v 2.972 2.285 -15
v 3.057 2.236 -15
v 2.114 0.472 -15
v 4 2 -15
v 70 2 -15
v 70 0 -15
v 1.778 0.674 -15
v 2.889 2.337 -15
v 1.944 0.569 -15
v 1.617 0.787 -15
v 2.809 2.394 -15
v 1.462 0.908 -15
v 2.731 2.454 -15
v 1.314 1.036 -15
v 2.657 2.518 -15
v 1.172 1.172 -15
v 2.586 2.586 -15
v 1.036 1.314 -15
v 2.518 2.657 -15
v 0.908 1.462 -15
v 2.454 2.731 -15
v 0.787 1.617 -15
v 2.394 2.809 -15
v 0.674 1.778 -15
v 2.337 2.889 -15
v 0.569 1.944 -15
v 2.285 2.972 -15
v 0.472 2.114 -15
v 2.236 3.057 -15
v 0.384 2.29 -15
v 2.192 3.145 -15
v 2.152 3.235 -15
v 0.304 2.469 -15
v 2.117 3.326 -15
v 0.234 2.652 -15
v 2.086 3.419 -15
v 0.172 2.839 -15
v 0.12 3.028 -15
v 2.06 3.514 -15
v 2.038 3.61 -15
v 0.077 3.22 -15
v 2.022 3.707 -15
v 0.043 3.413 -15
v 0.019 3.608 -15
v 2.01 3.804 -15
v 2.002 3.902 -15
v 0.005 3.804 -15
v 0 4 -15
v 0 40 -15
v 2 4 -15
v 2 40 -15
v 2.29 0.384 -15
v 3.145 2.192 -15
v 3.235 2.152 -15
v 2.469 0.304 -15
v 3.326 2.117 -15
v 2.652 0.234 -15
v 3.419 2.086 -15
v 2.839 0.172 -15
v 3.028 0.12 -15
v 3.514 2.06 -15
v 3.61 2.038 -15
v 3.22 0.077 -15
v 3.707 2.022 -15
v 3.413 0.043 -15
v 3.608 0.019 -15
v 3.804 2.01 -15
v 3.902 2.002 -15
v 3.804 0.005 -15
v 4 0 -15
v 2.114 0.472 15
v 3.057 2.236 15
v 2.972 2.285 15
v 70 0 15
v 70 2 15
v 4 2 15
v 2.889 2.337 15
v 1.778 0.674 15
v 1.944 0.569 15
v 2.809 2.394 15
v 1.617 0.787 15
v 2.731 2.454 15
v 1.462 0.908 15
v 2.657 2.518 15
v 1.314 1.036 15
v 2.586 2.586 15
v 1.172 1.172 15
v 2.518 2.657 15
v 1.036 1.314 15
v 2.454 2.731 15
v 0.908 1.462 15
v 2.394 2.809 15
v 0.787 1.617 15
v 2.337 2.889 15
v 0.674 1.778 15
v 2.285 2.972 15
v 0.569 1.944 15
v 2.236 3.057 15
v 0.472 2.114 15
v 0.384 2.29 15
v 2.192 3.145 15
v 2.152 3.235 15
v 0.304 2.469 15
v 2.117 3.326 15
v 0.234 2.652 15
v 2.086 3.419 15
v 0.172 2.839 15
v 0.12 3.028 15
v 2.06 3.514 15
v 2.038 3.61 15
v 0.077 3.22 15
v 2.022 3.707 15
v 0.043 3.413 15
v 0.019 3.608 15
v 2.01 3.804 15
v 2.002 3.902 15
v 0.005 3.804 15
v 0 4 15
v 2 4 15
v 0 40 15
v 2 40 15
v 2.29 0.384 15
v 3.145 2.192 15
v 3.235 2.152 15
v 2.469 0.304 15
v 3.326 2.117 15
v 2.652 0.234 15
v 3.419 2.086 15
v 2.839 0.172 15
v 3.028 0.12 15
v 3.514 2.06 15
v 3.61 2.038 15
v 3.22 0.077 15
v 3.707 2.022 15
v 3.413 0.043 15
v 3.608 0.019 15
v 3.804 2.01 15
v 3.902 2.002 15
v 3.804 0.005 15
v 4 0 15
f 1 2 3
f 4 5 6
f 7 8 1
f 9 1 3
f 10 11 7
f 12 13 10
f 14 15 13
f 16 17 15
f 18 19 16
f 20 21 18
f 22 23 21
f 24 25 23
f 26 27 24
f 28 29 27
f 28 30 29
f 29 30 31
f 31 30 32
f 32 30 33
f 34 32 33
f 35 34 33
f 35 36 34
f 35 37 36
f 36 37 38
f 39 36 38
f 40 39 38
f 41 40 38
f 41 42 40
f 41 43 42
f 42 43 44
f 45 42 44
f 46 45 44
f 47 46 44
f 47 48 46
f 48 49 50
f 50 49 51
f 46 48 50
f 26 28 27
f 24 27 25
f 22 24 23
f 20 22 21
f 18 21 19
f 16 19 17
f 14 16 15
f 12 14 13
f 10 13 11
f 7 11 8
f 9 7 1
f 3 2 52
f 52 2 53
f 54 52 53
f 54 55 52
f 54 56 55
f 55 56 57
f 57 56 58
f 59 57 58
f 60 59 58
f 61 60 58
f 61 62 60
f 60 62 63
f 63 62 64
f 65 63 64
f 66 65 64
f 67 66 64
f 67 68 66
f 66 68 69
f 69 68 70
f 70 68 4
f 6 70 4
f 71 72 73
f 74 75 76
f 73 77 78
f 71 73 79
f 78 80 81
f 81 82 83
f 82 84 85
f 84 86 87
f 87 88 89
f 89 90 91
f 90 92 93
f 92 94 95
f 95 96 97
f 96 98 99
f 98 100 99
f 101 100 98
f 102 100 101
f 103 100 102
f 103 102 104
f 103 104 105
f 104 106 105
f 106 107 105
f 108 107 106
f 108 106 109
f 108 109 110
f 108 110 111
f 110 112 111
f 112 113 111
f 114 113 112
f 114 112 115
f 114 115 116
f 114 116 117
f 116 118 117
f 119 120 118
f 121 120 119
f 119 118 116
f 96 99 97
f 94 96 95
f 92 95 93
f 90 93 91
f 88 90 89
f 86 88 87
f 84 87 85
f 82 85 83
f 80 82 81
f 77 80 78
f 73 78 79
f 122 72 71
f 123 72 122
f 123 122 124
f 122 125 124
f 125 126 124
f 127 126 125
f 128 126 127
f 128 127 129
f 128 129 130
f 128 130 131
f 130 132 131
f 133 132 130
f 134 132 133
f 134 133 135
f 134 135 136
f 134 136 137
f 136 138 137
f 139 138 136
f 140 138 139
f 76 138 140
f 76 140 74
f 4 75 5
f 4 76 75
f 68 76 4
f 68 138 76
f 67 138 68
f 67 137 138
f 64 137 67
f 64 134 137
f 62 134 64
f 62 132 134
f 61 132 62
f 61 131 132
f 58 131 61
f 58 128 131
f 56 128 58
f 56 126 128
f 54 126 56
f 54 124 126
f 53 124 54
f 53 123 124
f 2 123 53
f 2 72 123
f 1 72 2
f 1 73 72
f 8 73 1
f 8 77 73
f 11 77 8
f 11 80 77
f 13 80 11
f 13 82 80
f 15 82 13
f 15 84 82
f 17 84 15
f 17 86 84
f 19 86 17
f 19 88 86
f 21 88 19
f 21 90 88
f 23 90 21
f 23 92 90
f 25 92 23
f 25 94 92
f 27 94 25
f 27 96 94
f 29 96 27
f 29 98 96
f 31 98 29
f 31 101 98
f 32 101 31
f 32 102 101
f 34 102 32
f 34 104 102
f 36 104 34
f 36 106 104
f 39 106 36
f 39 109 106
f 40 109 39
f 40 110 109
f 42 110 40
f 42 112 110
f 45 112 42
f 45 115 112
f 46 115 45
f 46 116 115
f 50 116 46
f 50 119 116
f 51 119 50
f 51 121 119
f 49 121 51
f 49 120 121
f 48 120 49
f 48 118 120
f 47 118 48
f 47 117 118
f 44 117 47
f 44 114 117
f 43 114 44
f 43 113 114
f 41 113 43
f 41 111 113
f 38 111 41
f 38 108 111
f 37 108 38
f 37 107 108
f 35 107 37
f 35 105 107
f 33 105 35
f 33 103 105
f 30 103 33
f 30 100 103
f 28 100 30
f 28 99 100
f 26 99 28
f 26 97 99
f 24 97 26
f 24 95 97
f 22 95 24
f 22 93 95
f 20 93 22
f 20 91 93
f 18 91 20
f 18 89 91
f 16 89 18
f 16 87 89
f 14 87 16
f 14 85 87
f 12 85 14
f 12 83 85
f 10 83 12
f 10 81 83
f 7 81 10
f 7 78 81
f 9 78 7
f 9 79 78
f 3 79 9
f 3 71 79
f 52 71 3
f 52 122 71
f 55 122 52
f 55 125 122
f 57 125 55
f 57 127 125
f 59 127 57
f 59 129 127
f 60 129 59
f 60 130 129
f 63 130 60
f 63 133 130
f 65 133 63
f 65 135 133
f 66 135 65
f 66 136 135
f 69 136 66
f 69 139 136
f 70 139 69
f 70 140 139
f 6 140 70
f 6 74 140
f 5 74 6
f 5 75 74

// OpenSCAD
// MAKERBENCH SHEET-METAL L-BRACKET GENERATOR
// Design for Manufacturing (DFM) compliant model with flat pattern calculation.

// --- Physical Parameters ---
thickness = 2.0;          // Constant sheet-metal thickness (mm)
inside_radius = 2.0;      // Inside bend radius (mm)
flange1_outside = 70.0;   // Outside length of Flange 1 (mm)
flange2_outside = 40.0;   // Outside length of Flange 2 (mm)
width = 30.0;             // Bracket width (mm)
k_factor = 0.45;          // K-factor for bend allowance calculation

// --- DFM / Bend Calculations ---
outside_radius = inside_radius + thickness;

// Center of the concentric bend arcs (positioned to align outer surfaces with axes)
cx = outside_radius;
cy = outside_radius;

// Flat lengths of the straight portions (subtracting the bend zone)
s1 = flange1_outside - outside_radius;
s2 = flange2_outside - outside_radius;

// Bend Allowance (BA) calculation for a 90-degree bend
bend_angle_rad = 90.0 * 3.141592653589793 / 180.0;
ba = bend_angle_rad * (inside_radius + (k_factor * thickness));

// Total developed flat-pattern blank length
flat_length = s1 + s2 + ba;

// --- Helper Functions ---
function round3(val) = round(val * 1000) / 1000;

// --- Console Output / Manifest Echo ---
echo(str("MAKERBENCH-SHEETMETAL: {",
         "\"thickness_mm\": ", thickness, 
         ", \"bend_radius_mm\": ", inside_radius, 
         ", \"flat_length_mm\": ", round3(flat_length), 
         "}"));

// --- 2D Profile Generation ---
// Number of steps for a smooth 90-degree bend curve
steps = 32;

// Inside fillet arc (180 to 270 degrees)
inside_arc = [ 
    for (i = [0 : steps]) 
    let(ang = 180 + (i * 90 / steps)) 
    [cx + inside_radius * cos(ang), cy + inside_radius * sin(ang)] 
];

// Outside corner arc (270 down to 180 degrees)
outside_arc = [ 
    for (i = [0 : steps]) 
    let(ang = 270 - (i * 90 / steps)) 
    [cx + outside_radius * cos(ang), cy + outside_radius * sin(ang)] 
];

// Combine all boundary coordinates in a continuous counter-clockwise loop
profile_points = concat(
    [[0, flange2_outside], [thickness, flange2_outside]], // Flange 2 end and inner boundary
    inside_arc,                                           // Transition fillet (inside)
    [[flange1_outside, thickness], [flange1_outside, 0]], // Flange 1 inner boundary and end
    outside_arc                                           // Transition bend (outside)
);

// --- 3D Solid Extrusion ---
module bracket_3d() {
    linear_extrude(height = width, center = true, convexity = 10) {
        polygon(points = profile_points);
    }
}

// Render the final physical solid
bracket_3d();
